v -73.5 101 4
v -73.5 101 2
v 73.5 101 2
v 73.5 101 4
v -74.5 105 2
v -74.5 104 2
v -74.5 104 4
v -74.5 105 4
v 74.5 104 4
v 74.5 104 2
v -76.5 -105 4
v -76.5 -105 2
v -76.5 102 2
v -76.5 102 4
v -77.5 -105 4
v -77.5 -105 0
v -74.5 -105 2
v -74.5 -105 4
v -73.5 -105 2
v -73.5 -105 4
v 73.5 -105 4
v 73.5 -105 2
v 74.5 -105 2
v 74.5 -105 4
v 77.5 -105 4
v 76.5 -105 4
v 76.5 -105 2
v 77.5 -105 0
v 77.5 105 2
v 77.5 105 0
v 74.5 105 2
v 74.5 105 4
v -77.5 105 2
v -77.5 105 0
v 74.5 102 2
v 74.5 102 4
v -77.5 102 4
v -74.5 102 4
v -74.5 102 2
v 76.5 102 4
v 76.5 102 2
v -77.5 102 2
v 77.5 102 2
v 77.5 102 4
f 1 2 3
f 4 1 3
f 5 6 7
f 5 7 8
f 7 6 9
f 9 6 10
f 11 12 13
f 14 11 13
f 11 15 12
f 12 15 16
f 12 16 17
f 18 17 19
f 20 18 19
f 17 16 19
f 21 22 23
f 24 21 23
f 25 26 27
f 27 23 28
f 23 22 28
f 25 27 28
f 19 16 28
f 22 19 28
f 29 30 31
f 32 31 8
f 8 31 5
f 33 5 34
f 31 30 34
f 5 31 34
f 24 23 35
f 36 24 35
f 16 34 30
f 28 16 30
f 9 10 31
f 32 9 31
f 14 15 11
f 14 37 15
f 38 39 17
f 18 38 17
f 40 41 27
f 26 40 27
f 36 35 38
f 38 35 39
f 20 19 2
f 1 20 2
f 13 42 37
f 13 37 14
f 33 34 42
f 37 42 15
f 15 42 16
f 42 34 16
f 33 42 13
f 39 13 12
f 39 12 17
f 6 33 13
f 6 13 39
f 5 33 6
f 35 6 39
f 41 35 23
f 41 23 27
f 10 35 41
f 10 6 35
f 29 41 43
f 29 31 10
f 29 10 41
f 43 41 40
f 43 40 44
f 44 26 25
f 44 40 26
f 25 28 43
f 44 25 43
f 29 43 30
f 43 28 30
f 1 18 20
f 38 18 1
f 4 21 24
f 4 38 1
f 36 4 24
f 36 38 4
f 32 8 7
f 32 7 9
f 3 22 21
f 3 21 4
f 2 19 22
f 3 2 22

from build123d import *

# Parameters (mm, degrees)
F0_W     = 147
F0_H     = 206
F0_W_2   = 2
F0_H_2   = 1
F0_W_3   = 1
F1_DEPTH = 2
F2_DEPTH = 4


with BuildPart() as f1:
    # F0 (on Top) → F1 (new body)
    with BuildSketch(Plane.XY):
        with Locations((0, -2)):
            Rectangle(F0_W, F0_H)
        Polygon((77.5, 102), (77.5, 104), (76.5, 104), (74.5, 104), (73.5, 104), (-73.5, 104), (-74.5, 104), (-76.5, 104), (-77.5, 104), (-77.5, 102), (-76.5, 102), (-74.5, 102), (-73.5, 102), (73.5, 102), (74.5, 102), (76.5, 102), align=None)
        with Locations((75.5, -2)):
            Rectangle(F0_W_2, F0_H)
        with Locations((-75.5, -2)):
            Rectangle(F0_W_2, F0_H)
        with Locations((0, 101.5)):
            Rectangle(F0_W, F0_H_2)
        with Locations((74, -2)):
            Rectangle(F0_W_3, F0_H)
        with Locations((-74, -2)):
            Rectangle(F0_W_3, F0_H)
        with Locations((0, 104.5)):
            Rectangle(F0_W, F0_H_2)
        with Locations((-77, -2)):
            Rectangle(F0_W_3, F0_H)
        with Locations((77, -2)):
            Rectangle(F0_W_3, F0_H)
        with Locations((-74, 101.5)):
            Rectangle(F0_W_3, F0_H_2)
        with Locations((75.5, 101.5)):
            Rectangle(F0_W_2, F0_H_2)
        with Locations((74, 101.5)):
            Rectangle(F0_W_3, F0_H_2)
        with Locations((77, 101.5)):
            Rectangle(F0_W_3, F0_H_2)
        with Locations((-77, 101.5)):
            Rectangle(F0_W_3, F0_H_2)
        with Locations((-74, 104.5)):
            Rectangle(F0_W_3, F0_H_2)
        with Locations((74, 104.5)):
            Rectangle(F0_W_3, F0_H_2)
        with Locations((-75.5, 101.5)):
            Rectangle(F0_W_2, F0_H_2)
        with Locations((-75.5, 104.5)):
            Rectangle(F0_W_2, F0_H_2)
        with Locations((-77, 104.5)):
            Rectangle(F0_W_3, F0_H_2)
        with Locations((77, 104.5)):
            Rectangle(F0_W_3, F0_H_2)
        with Locations((75.5, 104.5)):
            Rectangle(F0_W_2, F0_H_2)
    extrude(amount=F1_DEPTH)

    # F0 (on Top) → F2 (join)
    with BuildSketch(Plane.XY):
        with Locations((77, -2)):
            Rectangle(F0_W_3, F0_H)
        with Locations((77, 101.5)):
            Rectangle(F0_W_3, F0_H_2)
        with Locations((-77, -2)):
            Rectangle(F0_W_3, F0_H)
        with Locations((-77, 101.5)):
            Rectangle(F0_W_3, F0_H_2)
        with Locations((-74, 104.5)):
            Rectangle(F0_W_3, F0_H_2)
        with Locations((74, 104.5)):
            Rectangle(F0_W_3, F0_H_2)
        with Locations((0, 104.5)):
            Rectangle(F0_W, F0_H_2)
        with Locations((0, 101.5)):
            Rectangle(F0_W, F0_H_2)
        with Locations((-74, -2)):
            Rectangle(F0_W_3, F0_H)
        with Locations((74, -2)):
            Rectangle(F0_W_3, F0_H)
        with Locations((-74, 101.5)):
            Rectangle(F0_W_3, F0_H_2)
        with Locations((74, 101.5)):
            Rectangle(F0_W_3, F0_H_2)
    extrude(amount=F2_DEPTH)


solid = f1.part
